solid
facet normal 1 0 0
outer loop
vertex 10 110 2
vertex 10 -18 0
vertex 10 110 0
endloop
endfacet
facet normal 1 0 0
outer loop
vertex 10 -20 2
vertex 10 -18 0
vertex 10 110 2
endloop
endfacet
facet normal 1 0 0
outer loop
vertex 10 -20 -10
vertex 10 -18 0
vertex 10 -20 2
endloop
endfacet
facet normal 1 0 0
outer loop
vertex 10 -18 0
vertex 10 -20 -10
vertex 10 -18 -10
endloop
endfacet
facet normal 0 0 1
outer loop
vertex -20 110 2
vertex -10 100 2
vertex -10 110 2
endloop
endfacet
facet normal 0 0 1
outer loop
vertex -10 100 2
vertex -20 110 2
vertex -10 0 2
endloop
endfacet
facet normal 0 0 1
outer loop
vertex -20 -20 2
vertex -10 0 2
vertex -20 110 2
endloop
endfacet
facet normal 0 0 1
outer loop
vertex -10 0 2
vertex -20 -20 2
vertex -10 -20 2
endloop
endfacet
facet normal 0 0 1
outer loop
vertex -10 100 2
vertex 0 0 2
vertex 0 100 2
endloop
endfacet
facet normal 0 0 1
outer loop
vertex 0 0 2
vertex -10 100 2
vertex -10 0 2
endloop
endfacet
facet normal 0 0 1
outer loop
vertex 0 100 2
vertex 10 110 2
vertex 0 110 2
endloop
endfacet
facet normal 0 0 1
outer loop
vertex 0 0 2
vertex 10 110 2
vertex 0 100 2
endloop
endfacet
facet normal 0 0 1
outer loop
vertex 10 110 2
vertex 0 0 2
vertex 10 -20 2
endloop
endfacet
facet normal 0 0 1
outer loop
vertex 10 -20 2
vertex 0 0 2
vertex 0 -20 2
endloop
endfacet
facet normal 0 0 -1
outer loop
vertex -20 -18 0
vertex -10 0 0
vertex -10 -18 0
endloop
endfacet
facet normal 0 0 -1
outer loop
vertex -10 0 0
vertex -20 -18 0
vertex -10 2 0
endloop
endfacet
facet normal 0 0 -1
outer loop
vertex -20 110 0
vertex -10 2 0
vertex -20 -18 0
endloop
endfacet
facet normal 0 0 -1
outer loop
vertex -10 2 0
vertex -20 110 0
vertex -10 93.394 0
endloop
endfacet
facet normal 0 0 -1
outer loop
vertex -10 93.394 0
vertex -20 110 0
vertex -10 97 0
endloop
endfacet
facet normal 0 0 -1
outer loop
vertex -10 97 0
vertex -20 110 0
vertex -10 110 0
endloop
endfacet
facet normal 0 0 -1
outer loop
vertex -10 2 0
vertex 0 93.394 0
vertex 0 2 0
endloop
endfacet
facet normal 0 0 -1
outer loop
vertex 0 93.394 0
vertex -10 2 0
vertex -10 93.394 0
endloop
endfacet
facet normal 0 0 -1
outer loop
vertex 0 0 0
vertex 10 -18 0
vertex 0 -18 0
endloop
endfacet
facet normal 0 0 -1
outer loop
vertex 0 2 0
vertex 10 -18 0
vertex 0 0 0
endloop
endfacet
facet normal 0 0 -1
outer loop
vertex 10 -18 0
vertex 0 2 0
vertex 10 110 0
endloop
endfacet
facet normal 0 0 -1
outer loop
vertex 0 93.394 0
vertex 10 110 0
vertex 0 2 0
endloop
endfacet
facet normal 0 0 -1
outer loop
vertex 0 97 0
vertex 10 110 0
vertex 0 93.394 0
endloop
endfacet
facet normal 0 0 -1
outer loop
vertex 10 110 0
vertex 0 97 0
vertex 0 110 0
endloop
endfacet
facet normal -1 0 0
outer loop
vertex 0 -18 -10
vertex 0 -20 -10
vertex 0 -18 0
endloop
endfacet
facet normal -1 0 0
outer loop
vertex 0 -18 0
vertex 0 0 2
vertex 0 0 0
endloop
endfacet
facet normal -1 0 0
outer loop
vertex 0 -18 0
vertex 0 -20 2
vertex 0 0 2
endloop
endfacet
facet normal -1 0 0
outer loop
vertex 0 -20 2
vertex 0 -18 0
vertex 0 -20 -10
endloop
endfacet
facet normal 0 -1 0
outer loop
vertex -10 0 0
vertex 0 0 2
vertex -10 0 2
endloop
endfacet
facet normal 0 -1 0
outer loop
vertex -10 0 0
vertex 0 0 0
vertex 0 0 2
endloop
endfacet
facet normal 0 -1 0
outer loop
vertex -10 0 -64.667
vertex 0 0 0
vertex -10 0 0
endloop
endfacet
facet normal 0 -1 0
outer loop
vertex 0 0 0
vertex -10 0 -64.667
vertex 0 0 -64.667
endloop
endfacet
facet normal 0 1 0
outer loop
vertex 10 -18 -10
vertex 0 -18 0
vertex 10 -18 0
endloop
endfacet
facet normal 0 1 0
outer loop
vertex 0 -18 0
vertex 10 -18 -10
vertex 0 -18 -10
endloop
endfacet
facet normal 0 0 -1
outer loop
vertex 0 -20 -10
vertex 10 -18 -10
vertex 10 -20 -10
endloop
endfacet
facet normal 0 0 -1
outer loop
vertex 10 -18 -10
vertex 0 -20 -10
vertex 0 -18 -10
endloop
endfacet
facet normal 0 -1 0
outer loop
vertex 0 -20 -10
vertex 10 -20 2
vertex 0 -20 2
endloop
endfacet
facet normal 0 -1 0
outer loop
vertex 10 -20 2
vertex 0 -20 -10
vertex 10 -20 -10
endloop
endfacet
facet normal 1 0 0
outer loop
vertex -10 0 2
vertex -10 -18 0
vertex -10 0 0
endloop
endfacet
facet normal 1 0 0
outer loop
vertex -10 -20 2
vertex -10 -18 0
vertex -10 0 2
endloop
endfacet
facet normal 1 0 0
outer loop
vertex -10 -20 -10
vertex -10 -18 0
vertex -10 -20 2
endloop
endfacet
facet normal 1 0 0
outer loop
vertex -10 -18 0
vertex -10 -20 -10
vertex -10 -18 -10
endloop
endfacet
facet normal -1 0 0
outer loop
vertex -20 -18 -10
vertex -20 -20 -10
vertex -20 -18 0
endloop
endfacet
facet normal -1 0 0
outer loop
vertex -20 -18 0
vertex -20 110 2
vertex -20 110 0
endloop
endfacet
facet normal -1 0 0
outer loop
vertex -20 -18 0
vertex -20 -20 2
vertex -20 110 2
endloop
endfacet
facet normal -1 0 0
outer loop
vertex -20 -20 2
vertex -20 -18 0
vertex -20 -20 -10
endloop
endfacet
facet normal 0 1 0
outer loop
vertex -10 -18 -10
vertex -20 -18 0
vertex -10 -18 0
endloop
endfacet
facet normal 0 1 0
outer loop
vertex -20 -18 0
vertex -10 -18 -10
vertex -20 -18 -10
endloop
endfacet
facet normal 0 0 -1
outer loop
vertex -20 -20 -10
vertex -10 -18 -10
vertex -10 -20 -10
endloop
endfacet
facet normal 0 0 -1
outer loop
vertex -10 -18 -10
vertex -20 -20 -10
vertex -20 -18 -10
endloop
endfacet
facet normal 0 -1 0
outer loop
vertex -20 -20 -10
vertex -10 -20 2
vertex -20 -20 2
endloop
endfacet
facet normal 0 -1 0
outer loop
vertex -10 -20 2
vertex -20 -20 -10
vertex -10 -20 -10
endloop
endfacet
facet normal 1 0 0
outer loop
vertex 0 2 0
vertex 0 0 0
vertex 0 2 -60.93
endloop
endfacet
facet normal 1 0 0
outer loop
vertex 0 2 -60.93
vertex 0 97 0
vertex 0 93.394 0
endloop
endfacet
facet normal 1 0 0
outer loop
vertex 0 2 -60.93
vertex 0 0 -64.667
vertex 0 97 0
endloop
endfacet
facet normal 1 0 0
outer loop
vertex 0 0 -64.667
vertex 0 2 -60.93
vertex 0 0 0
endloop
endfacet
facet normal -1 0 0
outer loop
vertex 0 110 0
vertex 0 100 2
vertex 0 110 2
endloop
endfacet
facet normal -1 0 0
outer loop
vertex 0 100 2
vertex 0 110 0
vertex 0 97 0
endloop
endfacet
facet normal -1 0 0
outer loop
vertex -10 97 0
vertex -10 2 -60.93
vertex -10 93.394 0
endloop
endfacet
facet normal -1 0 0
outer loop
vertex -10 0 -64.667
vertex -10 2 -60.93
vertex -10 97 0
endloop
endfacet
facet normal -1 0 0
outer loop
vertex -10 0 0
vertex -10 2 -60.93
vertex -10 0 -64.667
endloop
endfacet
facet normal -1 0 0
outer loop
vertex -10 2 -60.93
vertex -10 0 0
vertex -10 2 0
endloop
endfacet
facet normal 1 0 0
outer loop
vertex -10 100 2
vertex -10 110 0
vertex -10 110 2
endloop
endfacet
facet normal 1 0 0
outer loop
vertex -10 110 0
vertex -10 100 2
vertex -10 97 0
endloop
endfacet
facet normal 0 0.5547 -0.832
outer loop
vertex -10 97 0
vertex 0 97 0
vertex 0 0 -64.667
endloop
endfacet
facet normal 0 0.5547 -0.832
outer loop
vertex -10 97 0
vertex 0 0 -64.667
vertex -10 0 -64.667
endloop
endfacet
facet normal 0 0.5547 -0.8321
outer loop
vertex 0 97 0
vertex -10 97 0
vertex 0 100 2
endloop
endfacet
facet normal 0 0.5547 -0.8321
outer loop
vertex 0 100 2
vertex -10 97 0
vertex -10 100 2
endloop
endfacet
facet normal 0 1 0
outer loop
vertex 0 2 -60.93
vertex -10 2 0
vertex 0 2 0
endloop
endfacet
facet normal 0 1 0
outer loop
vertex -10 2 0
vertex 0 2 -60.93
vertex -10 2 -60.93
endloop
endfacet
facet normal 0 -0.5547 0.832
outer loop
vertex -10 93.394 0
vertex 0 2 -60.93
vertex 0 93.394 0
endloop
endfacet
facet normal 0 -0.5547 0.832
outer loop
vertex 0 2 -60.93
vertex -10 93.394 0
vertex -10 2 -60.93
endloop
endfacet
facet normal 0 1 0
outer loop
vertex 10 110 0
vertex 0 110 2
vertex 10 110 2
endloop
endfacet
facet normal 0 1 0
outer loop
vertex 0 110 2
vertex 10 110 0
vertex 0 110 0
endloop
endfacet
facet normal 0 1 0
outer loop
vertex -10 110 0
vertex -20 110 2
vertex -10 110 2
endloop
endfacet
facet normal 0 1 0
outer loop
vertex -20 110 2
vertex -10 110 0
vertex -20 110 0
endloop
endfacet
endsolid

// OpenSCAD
drawer = 18;
hook = 100;
width = 10;
anker = 10;
ram = 10;
thin = 2;

pier = hook*2/3;

hook(drawer, anker, width, thin);
bridge(hook, width, ram, thin);

module hook(drawer, anker, width, thin)
{
    translate([width/2, -drawer/2, thin/2])
    {
        cube([width, drawer, thin], true);
    }
    translate([width/2, -(drawer+thin/2), (-anker+thin)/2])
    {
        cube([width, thin, anker+thin], true);
    }
    translate([-width*3/2, -drawer/2, thin/2])
    {
        cube([width, drawer, thin], true);
    }
    translate([-width*3/2, -(drawer+thin/2), (-anker+thin)/2])
    {
        cube([width, thin, anker+thin], true);
    }
}

module bridge(hook, width, ram, thin)
{
    translate([0, 0, thin])
    {
        rotate([0, 90, -180])
        {
            linear_extrude(height=width)
            {
                difference(){
                    polygon([[0, 0], [pier, 0], [0, -hook]]);
                    offset(r = -thin)
                    {
                                    polygon([[0, 0], [pier, 0], [0, -hook]]);
                    }
                }
            }
        }
    }
    translate([width/2, (hook+ram)/2, thin/2])
    {
        cube([width, hook+ram, thin], true);
    }
    translate([-(width*3)/2, (hook+ram)/2, thin/2])
    {
        cube([width, hook+ram, thin], true);
    }
}
